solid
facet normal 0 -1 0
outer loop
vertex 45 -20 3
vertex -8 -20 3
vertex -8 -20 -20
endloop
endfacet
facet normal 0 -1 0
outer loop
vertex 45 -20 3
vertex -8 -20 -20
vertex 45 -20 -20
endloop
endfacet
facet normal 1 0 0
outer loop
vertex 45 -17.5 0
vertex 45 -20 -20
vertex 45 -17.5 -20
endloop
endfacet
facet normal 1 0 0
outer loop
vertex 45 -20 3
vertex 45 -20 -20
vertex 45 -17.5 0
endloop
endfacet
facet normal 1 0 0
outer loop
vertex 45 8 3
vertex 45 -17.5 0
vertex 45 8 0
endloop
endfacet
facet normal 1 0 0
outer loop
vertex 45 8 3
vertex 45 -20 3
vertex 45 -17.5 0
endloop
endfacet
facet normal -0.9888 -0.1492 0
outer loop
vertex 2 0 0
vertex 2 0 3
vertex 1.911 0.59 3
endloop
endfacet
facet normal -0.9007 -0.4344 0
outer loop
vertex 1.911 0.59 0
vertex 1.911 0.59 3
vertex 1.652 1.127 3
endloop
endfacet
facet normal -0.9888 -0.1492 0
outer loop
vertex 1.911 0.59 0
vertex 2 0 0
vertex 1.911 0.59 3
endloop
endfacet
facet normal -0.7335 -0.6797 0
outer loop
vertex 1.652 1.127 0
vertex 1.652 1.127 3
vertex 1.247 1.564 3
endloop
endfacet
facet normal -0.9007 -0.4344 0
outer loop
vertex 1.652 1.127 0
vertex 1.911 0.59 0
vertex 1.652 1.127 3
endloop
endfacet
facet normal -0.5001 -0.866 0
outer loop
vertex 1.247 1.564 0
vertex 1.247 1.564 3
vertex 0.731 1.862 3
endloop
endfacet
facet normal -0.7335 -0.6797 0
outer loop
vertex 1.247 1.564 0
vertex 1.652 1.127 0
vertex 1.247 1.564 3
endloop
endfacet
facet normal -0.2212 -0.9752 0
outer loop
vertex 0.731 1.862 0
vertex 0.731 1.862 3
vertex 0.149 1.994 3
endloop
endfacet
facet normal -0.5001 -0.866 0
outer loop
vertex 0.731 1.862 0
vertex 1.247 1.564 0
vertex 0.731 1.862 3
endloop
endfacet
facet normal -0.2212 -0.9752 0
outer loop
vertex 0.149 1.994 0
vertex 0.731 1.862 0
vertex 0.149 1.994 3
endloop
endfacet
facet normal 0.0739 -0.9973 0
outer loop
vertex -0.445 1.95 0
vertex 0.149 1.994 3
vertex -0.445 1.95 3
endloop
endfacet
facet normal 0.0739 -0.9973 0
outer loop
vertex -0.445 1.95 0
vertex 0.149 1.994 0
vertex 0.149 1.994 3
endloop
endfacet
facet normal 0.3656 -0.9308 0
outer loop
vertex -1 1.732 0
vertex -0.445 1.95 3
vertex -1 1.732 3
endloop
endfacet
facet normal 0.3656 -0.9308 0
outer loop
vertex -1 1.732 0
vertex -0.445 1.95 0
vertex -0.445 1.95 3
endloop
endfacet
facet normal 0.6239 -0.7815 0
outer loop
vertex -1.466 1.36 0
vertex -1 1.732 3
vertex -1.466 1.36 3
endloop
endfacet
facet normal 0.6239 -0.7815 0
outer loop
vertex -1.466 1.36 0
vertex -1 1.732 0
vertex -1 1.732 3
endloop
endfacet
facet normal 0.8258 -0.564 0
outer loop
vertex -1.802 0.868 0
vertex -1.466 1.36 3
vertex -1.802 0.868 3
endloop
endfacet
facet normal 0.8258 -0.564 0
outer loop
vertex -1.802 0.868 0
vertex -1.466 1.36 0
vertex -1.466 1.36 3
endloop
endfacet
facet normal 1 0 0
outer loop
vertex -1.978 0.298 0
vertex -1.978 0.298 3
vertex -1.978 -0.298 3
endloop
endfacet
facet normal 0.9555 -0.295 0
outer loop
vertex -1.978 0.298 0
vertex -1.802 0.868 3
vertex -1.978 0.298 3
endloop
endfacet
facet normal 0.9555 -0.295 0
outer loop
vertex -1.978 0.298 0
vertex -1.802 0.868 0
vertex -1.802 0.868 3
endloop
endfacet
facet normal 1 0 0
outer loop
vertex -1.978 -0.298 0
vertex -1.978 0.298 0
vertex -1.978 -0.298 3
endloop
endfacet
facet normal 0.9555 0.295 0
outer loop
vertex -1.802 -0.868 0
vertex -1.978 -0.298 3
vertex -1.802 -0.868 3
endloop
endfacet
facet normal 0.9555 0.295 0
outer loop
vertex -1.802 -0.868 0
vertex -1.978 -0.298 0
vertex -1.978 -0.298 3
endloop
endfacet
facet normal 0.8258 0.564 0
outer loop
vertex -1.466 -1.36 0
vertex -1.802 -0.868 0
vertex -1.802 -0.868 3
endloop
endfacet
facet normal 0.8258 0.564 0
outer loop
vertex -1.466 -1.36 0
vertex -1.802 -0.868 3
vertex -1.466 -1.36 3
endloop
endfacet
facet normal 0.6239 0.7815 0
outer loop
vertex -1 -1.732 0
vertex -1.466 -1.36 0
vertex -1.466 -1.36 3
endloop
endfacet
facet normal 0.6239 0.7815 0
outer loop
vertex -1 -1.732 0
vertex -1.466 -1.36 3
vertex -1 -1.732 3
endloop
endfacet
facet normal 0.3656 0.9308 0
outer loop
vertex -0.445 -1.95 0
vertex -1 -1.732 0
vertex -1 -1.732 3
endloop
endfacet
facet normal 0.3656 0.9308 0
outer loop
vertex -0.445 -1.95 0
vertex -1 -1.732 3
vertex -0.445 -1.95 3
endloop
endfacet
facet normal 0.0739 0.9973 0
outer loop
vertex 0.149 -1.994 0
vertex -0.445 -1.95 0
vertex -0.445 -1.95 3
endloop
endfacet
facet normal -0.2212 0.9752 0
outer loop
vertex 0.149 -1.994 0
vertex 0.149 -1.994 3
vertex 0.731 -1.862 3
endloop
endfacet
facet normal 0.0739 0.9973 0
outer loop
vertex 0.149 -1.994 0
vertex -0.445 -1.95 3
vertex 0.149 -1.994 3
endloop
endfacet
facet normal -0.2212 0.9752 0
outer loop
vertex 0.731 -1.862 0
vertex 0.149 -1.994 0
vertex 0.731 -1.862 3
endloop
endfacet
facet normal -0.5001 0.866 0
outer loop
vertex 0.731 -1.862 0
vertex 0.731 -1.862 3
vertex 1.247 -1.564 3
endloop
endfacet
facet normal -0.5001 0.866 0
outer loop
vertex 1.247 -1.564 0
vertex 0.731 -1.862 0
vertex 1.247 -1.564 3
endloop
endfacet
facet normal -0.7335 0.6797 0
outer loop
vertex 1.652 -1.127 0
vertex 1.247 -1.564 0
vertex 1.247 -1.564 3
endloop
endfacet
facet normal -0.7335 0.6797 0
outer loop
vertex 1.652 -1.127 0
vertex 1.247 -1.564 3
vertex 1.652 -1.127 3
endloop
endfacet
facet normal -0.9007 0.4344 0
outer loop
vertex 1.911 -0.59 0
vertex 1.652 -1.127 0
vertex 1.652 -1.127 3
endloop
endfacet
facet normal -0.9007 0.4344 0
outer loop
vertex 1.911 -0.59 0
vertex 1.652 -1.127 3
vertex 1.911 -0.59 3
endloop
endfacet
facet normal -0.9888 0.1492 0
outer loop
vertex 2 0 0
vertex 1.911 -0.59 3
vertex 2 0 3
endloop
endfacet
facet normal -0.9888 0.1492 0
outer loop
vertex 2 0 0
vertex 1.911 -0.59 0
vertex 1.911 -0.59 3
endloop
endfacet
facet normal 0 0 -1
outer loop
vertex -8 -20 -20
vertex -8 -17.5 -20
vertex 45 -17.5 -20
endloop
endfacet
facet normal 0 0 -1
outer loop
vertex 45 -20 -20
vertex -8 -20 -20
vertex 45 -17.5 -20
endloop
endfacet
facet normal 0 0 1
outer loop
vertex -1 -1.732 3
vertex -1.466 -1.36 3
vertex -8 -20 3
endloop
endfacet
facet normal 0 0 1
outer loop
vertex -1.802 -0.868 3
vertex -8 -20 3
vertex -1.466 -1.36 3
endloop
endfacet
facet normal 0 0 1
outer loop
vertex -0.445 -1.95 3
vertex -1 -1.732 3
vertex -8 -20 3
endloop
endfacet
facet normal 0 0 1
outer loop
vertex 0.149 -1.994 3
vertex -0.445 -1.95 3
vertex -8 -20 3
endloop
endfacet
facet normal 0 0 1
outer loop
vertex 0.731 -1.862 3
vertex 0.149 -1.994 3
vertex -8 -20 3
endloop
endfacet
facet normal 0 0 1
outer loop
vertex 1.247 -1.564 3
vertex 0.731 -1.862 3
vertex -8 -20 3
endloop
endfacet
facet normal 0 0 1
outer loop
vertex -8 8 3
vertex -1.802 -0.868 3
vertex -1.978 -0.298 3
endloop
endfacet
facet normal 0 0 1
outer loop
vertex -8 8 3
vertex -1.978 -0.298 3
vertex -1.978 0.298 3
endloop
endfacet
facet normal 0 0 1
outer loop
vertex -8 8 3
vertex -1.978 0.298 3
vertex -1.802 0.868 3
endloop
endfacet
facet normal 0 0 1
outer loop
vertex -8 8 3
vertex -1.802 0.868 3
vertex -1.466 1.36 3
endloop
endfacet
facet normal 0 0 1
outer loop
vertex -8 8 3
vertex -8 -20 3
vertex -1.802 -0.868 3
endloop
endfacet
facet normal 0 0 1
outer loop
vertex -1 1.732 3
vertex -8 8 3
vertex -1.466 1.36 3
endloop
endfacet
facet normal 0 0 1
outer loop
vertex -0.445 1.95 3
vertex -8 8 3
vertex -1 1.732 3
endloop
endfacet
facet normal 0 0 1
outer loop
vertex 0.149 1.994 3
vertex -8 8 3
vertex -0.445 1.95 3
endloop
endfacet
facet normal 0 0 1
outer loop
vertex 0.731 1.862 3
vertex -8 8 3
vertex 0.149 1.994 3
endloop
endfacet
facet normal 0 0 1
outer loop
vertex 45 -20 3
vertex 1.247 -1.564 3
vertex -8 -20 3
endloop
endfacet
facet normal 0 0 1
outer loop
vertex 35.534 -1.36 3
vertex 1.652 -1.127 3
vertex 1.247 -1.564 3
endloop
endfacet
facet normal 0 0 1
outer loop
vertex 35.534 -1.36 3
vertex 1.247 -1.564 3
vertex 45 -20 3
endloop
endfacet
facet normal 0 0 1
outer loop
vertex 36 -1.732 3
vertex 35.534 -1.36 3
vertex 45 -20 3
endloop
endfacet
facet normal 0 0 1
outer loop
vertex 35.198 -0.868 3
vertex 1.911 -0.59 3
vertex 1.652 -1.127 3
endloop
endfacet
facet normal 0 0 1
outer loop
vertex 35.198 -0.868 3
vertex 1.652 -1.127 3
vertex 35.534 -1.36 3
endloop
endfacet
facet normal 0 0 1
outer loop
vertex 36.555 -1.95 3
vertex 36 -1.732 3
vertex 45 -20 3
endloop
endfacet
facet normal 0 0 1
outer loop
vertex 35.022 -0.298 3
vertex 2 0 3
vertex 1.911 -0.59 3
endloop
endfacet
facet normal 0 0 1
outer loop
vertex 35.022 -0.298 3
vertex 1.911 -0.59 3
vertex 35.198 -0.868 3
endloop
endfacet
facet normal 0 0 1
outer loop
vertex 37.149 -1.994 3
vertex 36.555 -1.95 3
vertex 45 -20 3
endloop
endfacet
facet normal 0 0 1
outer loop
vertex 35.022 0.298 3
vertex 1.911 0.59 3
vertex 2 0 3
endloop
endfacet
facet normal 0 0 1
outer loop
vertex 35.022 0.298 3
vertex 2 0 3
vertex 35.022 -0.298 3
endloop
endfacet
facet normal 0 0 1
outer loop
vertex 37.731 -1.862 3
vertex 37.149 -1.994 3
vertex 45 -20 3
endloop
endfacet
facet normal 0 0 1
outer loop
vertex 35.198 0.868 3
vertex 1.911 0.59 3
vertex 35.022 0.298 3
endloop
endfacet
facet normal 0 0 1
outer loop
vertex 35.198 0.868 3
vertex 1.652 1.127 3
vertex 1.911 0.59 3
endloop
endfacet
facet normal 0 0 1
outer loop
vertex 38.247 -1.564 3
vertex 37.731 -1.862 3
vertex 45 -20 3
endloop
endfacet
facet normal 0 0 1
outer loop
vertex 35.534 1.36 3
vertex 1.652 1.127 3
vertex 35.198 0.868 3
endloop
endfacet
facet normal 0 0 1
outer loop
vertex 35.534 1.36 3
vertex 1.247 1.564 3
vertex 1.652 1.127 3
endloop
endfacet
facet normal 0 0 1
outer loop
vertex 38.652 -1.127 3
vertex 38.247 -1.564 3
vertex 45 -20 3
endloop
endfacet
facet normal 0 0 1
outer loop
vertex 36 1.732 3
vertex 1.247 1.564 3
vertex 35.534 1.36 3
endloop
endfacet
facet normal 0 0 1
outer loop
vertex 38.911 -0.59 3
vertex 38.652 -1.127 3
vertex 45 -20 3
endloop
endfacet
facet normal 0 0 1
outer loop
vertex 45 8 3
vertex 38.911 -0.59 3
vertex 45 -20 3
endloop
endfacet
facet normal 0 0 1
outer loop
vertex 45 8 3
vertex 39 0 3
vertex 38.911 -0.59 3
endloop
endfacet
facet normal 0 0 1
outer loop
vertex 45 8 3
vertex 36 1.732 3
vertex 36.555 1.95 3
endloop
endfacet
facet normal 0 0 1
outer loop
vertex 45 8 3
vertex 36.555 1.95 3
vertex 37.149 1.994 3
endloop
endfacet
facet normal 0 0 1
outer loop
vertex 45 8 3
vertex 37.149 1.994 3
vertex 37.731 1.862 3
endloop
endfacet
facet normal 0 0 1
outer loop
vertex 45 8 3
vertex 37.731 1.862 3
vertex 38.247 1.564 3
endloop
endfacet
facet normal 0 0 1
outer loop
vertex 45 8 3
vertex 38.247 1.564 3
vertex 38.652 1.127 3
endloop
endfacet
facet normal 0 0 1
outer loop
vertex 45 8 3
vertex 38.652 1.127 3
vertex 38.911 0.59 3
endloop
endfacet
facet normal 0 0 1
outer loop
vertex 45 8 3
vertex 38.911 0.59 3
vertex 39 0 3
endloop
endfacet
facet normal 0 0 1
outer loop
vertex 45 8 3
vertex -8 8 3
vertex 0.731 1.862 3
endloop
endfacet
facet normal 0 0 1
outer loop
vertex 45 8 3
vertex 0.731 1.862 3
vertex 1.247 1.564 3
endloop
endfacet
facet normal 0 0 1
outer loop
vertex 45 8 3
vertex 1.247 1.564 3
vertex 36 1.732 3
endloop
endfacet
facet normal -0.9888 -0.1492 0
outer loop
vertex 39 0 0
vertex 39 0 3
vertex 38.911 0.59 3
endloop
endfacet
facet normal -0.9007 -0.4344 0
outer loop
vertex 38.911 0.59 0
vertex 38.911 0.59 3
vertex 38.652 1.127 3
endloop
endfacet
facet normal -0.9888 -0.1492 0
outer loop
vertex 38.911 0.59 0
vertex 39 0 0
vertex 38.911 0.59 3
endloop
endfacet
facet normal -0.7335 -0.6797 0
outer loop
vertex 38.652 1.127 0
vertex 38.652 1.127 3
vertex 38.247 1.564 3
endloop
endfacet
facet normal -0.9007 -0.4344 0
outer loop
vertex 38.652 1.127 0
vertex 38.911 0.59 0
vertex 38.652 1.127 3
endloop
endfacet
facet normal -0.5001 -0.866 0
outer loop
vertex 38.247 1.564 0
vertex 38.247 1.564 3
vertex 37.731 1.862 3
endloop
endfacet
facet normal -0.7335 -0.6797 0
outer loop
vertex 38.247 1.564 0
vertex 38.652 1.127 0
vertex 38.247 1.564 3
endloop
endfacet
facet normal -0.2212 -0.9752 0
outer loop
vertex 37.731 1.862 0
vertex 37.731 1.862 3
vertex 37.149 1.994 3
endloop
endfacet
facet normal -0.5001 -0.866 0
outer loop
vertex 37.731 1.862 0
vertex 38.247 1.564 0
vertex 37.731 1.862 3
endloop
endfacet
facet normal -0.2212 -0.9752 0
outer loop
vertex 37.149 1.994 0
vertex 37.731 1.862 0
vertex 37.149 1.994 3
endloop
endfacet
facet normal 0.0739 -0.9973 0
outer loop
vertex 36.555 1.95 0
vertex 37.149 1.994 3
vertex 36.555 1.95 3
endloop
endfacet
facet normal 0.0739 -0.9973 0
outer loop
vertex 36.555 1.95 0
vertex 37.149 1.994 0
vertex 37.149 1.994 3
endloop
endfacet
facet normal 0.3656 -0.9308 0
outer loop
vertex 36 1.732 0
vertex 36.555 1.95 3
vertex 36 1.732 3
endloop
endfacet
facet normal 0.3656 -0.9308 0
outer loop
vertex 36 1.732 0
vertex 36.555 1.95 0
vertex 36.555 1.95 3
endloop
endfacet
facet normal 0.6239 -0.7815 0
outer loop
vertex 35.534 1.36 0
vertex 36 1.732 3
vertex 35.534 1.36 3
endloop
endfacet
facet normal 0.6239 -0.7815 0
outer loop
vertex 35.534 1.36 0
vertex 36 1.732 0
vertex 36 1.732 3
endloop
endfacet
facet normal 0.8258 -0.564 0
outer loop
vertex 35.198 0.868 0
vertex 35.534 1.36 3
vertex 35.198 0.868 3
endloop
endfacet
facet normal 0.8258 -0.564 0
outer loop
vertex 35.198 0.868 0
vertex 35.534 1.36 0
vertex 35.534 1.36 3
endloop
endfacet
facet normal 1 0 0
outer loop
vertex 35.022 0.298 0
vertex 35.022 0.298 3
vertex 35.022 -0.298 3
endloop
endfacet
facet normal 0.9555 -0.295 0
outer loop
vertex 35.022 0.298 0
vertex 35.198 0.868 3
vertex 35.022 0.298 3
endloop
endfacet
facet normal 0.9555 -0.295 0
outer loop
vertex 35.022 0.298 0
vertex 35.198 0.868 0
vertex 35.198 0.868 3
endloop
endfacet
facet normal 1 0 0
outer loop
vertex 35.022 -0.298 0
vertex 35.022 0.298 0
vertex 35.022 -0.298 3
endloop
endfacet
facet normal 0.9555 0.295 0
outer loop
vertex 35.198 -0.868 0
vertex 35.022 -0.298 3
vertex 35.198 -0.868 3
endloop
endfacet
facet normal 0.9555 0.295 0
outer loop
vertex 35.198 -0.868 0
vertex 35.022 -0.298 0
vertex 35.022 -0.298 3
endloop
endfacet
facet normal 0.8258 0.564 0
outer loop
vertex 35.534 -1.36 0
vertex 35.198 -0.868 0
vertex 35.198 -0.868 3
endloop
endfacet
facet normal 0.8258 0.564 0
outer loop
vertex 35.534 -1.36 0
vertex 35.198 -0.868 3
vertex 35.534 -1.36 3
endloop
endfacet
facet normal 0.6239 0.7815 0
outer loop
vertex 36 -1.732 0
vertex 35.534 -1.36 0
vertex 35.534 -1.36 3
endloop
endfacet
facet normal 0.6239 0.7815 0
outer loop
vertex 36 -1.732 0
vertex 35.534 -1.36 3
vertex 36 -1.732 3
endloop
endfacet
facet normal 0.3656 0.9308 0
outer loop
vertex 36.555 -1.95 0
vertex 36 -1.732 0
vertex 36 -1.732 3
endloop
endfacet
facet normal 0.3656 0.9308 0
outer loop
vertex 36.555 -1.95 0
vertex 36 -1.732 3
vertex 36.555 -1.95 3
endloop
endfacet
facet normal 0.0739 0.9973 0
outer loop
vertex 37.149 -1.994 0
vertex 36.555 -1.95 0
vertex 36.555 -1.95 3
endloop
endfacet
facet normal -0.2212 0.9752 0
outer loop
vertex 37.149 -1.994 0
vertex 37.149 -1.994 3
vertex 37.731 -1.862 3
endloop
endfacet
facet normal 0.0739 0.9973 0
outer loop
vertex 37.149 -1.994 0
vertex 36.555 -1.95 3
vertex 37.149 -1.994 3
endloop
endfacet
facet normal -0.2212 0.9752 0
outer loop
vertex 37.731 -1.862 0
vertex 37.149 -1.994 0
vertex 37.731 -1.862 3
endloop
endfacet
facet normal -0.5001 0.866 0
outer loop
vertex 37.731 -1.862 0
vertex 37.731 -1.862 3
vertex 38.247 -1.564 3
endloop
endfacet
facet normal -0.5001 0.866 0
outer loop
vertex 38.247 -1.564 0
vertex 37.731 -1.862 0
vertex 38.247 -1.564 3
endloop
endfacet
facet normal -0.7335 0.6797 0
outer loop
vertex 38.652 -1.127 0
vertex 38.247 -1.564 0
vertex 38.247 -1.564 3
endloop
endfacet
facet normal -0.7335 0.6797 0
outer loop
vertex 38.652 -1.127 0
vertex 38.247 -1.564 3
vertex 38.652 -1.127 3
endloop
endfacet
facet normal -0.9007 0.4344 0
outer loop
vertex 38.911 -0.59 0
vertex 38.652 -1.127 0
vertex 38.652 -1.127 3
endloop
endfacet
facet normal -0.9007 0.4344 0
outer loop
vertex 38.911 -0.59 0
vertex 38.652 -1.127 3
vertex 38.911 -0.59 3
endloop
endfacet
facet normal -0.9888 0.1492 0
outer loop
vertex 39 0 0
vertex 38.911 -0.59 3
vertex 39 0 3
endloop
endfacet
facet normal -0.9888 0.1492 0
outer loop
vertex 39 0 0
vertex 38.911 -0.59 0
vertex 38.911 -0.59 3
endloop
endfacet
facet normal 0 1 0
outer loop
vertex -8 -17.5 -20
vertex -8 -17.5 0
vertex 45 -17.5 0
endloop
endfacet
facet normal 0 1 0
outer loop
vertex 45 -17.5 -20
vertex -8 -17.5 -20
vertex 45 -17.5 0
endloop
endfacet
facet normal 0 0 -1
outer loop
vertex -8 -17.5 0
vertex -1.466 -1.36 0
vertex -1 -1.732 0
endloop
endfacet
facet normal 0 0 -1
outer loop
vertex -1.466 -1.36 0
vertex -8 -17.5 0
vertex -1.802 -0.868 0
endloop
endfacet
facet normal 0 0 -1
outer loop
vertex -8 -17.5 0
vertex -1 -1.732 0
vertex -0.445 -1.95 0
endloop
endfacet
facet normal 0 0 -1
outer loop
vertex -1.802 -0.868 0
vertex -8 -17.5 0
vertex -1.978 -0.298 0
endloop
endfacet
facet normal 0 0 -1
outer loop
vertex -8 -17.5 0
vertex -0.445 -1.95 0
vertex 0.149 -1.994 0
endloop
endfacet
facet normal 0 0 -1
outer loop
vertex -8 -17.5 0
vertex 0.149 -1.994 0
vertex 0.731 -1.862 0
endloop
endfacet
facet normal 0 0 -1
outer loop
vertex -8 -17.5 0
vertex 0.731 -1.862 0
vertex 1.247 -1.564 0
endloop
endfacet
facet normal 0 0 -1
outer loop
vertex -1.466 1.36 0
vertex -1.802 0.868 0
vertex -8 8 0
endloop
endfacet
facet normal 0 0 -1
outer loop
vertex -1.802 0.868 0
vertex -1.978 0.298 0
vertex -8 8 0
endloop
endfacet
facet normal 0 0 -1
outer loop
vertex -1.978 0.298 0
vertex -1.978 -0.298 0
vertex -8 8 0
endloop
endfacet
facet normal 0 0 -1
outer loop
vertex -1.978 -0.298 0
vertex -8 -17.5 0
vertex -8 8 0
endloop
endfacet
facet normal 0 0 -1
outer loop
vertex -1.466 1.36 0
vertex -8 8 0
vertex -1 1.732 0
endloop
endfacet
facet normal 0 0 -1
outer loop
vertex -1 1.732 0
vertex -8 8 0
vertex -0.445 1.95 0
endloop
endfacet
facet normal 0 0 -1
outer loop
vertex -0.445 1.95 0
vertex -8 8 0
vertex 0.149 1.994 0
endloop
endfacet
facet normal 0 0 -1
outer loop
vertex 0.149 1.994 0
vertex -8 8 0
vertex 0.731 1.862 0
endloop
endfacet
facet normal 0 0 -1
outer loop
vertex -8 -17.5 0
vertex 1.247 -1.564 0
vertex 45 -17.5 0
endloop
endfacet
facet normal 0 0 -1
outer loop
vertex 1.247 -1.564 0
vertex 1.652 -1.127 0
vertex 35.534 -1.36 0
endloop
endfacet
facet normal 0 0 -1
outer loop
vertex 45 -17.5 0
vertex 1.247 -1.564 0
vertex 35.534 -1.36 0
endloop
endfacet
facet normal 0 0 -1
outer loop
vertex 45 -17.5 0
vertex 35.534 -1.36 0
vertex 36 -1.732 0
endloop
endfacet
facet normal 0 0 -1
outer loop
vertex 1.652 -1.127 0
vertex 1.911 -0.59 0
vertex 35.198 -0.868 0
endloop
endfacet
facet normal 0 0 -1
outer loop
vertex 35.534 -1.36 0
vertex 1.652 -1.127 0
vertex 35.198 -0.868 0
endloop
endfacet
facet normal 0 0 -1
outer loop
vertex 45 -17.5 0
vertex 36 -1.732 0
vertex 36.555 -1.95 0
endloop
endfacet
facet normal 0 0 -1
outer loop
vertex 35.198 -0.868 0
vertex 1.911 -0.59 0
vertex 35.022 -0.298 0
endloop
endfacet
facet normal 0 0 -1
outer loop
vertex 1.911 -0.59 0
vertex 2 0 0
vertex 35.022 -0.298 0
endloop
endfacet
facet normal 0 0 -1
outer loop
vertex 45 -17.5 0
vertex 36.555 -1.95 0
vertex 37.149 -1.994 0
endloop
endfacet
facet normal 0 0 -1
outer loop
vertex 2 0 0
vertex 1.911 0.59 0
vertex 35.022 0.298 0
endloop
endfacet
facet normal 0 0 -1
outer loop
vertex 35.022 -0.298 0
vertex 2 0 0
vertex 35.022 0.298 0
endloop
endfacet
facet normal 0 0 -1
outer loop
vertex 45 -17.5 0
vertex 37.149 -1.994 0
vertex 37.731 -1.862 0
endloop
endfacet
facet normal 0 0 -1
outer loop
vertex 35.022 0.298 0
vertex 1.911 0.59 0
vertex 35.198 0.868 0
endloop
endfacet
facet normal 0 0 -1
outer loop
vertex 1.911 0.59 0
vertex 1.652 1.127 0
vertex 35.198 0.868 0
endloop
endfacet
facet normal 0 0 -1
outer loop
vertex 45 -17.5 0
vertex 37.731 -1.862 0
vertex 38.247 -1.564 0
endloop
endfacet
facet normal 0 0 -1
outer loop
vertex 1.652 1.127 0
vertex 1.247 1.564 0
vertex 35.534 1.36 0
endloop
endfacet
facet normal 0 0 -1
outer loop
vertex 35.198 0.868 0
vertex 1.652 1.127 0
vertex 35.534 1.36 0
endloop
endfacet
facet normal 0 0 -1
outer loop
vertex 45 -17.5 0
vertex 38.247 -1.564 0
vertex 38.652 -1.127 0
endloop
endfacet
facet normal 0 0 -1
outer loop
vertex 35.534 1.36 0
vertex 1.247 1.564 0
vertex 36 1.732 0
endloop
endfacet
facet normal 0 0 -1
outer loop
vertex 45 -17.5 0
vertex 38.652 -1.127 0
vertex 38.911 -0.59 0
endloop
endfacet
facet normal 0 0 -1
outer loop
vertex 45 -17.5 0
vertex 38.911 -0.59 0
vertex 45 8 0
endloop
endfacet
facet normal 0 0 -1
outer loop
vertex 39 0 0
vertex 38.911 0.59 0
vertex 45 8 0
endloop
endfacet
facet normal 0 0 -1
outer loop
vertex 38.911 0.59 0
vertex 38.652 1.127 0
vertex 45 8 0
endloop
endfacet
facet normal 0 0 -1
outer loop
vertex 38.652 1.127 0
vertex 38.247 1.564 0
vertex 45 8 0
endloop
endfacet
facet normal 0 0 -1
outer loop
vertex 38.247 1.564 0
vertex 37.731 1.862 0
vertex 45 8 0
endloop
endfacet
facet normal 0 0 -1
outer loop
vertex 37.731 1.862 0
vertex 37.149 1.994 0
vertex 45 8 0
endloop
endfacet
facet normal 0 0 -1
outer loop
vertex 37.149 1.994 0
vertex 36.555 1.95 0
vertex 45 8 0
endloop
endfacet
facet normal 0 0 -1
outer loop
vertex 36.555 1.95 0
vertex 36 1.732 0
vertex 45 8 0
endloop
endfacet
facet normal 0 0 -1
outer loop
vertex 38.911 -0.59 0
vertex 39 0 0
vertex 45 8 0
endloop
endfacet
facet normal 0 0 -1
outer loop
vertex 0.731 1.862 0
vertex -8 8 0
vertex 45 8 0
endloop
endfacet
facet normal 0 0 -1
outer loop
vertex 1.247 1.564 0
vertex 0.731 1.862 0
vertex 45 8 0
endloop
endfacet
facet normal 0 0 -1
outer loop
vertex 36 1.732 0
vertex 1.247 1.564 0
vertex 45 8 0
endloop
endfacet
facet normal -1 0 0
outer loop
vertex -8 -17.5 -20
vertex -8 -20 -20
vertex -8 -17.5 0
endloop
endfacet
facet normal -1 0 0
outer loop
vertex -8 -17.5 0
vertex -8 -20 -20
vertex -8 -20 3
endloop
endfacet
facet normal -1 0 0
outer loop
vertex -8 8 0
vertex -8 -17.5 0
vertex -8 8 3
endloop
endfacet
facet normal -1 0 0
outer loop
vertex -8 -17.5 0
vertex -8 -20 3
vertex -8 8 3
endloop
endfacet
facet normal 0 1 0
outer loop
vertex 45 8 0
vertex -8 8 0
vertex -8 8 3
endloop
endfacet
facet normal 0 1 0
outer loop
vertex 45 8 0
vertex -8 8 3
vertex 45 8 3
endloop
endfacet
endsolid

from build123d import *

# Parameters (mm, degrees)
SKETCH002_W     = 53
SKETCH002_H     = 28
PAD_DEPTH       = 3
SKETCH_R        = 2
POCKET_DEPTH    = 5
SKETCH001_R     = 2
POCKET001_DEPTH = 5
SKETCH003_W     = 53
SKETCH003_H     = 2.5
PAD001_DEPTH    = 20


with BuildPart() as part:
    # Sketch002 → Pad (new body)
    with BuildSketch(Plane.XY):
        with Locations((18.5, -6)):
            Rectangle(SKETCH002_W, SKETCH002_H)
    extrude(amount=PAD_DEPTH)

    # Sketch → Pocket (cut)
    with BuildSketch(Plane.XY):
        Circle(SKETCH_R)
    extrude(amount=POCKET_DEPTH, mode=Mode.SUBTRACT)

    # Sketch001 → Pocket001 (cut)
    with BuildSketch(Plane.XY):
        with Locations((37, 0)):
            Circle(SKETCH001_R)
    extrude(amount=POCKET001_DEPTH, mode=Mode.SUBTRACT)

    # Sketch003 → Pad001 (join)
    with BuildSketch(Plane.XY):
        with Locations((18.5, -18.75)):
            Rectangle(SKETCH003_W, SKETCH003_H)
    extrude(amount=-PAD001_DEPTH)


solid = part.part
